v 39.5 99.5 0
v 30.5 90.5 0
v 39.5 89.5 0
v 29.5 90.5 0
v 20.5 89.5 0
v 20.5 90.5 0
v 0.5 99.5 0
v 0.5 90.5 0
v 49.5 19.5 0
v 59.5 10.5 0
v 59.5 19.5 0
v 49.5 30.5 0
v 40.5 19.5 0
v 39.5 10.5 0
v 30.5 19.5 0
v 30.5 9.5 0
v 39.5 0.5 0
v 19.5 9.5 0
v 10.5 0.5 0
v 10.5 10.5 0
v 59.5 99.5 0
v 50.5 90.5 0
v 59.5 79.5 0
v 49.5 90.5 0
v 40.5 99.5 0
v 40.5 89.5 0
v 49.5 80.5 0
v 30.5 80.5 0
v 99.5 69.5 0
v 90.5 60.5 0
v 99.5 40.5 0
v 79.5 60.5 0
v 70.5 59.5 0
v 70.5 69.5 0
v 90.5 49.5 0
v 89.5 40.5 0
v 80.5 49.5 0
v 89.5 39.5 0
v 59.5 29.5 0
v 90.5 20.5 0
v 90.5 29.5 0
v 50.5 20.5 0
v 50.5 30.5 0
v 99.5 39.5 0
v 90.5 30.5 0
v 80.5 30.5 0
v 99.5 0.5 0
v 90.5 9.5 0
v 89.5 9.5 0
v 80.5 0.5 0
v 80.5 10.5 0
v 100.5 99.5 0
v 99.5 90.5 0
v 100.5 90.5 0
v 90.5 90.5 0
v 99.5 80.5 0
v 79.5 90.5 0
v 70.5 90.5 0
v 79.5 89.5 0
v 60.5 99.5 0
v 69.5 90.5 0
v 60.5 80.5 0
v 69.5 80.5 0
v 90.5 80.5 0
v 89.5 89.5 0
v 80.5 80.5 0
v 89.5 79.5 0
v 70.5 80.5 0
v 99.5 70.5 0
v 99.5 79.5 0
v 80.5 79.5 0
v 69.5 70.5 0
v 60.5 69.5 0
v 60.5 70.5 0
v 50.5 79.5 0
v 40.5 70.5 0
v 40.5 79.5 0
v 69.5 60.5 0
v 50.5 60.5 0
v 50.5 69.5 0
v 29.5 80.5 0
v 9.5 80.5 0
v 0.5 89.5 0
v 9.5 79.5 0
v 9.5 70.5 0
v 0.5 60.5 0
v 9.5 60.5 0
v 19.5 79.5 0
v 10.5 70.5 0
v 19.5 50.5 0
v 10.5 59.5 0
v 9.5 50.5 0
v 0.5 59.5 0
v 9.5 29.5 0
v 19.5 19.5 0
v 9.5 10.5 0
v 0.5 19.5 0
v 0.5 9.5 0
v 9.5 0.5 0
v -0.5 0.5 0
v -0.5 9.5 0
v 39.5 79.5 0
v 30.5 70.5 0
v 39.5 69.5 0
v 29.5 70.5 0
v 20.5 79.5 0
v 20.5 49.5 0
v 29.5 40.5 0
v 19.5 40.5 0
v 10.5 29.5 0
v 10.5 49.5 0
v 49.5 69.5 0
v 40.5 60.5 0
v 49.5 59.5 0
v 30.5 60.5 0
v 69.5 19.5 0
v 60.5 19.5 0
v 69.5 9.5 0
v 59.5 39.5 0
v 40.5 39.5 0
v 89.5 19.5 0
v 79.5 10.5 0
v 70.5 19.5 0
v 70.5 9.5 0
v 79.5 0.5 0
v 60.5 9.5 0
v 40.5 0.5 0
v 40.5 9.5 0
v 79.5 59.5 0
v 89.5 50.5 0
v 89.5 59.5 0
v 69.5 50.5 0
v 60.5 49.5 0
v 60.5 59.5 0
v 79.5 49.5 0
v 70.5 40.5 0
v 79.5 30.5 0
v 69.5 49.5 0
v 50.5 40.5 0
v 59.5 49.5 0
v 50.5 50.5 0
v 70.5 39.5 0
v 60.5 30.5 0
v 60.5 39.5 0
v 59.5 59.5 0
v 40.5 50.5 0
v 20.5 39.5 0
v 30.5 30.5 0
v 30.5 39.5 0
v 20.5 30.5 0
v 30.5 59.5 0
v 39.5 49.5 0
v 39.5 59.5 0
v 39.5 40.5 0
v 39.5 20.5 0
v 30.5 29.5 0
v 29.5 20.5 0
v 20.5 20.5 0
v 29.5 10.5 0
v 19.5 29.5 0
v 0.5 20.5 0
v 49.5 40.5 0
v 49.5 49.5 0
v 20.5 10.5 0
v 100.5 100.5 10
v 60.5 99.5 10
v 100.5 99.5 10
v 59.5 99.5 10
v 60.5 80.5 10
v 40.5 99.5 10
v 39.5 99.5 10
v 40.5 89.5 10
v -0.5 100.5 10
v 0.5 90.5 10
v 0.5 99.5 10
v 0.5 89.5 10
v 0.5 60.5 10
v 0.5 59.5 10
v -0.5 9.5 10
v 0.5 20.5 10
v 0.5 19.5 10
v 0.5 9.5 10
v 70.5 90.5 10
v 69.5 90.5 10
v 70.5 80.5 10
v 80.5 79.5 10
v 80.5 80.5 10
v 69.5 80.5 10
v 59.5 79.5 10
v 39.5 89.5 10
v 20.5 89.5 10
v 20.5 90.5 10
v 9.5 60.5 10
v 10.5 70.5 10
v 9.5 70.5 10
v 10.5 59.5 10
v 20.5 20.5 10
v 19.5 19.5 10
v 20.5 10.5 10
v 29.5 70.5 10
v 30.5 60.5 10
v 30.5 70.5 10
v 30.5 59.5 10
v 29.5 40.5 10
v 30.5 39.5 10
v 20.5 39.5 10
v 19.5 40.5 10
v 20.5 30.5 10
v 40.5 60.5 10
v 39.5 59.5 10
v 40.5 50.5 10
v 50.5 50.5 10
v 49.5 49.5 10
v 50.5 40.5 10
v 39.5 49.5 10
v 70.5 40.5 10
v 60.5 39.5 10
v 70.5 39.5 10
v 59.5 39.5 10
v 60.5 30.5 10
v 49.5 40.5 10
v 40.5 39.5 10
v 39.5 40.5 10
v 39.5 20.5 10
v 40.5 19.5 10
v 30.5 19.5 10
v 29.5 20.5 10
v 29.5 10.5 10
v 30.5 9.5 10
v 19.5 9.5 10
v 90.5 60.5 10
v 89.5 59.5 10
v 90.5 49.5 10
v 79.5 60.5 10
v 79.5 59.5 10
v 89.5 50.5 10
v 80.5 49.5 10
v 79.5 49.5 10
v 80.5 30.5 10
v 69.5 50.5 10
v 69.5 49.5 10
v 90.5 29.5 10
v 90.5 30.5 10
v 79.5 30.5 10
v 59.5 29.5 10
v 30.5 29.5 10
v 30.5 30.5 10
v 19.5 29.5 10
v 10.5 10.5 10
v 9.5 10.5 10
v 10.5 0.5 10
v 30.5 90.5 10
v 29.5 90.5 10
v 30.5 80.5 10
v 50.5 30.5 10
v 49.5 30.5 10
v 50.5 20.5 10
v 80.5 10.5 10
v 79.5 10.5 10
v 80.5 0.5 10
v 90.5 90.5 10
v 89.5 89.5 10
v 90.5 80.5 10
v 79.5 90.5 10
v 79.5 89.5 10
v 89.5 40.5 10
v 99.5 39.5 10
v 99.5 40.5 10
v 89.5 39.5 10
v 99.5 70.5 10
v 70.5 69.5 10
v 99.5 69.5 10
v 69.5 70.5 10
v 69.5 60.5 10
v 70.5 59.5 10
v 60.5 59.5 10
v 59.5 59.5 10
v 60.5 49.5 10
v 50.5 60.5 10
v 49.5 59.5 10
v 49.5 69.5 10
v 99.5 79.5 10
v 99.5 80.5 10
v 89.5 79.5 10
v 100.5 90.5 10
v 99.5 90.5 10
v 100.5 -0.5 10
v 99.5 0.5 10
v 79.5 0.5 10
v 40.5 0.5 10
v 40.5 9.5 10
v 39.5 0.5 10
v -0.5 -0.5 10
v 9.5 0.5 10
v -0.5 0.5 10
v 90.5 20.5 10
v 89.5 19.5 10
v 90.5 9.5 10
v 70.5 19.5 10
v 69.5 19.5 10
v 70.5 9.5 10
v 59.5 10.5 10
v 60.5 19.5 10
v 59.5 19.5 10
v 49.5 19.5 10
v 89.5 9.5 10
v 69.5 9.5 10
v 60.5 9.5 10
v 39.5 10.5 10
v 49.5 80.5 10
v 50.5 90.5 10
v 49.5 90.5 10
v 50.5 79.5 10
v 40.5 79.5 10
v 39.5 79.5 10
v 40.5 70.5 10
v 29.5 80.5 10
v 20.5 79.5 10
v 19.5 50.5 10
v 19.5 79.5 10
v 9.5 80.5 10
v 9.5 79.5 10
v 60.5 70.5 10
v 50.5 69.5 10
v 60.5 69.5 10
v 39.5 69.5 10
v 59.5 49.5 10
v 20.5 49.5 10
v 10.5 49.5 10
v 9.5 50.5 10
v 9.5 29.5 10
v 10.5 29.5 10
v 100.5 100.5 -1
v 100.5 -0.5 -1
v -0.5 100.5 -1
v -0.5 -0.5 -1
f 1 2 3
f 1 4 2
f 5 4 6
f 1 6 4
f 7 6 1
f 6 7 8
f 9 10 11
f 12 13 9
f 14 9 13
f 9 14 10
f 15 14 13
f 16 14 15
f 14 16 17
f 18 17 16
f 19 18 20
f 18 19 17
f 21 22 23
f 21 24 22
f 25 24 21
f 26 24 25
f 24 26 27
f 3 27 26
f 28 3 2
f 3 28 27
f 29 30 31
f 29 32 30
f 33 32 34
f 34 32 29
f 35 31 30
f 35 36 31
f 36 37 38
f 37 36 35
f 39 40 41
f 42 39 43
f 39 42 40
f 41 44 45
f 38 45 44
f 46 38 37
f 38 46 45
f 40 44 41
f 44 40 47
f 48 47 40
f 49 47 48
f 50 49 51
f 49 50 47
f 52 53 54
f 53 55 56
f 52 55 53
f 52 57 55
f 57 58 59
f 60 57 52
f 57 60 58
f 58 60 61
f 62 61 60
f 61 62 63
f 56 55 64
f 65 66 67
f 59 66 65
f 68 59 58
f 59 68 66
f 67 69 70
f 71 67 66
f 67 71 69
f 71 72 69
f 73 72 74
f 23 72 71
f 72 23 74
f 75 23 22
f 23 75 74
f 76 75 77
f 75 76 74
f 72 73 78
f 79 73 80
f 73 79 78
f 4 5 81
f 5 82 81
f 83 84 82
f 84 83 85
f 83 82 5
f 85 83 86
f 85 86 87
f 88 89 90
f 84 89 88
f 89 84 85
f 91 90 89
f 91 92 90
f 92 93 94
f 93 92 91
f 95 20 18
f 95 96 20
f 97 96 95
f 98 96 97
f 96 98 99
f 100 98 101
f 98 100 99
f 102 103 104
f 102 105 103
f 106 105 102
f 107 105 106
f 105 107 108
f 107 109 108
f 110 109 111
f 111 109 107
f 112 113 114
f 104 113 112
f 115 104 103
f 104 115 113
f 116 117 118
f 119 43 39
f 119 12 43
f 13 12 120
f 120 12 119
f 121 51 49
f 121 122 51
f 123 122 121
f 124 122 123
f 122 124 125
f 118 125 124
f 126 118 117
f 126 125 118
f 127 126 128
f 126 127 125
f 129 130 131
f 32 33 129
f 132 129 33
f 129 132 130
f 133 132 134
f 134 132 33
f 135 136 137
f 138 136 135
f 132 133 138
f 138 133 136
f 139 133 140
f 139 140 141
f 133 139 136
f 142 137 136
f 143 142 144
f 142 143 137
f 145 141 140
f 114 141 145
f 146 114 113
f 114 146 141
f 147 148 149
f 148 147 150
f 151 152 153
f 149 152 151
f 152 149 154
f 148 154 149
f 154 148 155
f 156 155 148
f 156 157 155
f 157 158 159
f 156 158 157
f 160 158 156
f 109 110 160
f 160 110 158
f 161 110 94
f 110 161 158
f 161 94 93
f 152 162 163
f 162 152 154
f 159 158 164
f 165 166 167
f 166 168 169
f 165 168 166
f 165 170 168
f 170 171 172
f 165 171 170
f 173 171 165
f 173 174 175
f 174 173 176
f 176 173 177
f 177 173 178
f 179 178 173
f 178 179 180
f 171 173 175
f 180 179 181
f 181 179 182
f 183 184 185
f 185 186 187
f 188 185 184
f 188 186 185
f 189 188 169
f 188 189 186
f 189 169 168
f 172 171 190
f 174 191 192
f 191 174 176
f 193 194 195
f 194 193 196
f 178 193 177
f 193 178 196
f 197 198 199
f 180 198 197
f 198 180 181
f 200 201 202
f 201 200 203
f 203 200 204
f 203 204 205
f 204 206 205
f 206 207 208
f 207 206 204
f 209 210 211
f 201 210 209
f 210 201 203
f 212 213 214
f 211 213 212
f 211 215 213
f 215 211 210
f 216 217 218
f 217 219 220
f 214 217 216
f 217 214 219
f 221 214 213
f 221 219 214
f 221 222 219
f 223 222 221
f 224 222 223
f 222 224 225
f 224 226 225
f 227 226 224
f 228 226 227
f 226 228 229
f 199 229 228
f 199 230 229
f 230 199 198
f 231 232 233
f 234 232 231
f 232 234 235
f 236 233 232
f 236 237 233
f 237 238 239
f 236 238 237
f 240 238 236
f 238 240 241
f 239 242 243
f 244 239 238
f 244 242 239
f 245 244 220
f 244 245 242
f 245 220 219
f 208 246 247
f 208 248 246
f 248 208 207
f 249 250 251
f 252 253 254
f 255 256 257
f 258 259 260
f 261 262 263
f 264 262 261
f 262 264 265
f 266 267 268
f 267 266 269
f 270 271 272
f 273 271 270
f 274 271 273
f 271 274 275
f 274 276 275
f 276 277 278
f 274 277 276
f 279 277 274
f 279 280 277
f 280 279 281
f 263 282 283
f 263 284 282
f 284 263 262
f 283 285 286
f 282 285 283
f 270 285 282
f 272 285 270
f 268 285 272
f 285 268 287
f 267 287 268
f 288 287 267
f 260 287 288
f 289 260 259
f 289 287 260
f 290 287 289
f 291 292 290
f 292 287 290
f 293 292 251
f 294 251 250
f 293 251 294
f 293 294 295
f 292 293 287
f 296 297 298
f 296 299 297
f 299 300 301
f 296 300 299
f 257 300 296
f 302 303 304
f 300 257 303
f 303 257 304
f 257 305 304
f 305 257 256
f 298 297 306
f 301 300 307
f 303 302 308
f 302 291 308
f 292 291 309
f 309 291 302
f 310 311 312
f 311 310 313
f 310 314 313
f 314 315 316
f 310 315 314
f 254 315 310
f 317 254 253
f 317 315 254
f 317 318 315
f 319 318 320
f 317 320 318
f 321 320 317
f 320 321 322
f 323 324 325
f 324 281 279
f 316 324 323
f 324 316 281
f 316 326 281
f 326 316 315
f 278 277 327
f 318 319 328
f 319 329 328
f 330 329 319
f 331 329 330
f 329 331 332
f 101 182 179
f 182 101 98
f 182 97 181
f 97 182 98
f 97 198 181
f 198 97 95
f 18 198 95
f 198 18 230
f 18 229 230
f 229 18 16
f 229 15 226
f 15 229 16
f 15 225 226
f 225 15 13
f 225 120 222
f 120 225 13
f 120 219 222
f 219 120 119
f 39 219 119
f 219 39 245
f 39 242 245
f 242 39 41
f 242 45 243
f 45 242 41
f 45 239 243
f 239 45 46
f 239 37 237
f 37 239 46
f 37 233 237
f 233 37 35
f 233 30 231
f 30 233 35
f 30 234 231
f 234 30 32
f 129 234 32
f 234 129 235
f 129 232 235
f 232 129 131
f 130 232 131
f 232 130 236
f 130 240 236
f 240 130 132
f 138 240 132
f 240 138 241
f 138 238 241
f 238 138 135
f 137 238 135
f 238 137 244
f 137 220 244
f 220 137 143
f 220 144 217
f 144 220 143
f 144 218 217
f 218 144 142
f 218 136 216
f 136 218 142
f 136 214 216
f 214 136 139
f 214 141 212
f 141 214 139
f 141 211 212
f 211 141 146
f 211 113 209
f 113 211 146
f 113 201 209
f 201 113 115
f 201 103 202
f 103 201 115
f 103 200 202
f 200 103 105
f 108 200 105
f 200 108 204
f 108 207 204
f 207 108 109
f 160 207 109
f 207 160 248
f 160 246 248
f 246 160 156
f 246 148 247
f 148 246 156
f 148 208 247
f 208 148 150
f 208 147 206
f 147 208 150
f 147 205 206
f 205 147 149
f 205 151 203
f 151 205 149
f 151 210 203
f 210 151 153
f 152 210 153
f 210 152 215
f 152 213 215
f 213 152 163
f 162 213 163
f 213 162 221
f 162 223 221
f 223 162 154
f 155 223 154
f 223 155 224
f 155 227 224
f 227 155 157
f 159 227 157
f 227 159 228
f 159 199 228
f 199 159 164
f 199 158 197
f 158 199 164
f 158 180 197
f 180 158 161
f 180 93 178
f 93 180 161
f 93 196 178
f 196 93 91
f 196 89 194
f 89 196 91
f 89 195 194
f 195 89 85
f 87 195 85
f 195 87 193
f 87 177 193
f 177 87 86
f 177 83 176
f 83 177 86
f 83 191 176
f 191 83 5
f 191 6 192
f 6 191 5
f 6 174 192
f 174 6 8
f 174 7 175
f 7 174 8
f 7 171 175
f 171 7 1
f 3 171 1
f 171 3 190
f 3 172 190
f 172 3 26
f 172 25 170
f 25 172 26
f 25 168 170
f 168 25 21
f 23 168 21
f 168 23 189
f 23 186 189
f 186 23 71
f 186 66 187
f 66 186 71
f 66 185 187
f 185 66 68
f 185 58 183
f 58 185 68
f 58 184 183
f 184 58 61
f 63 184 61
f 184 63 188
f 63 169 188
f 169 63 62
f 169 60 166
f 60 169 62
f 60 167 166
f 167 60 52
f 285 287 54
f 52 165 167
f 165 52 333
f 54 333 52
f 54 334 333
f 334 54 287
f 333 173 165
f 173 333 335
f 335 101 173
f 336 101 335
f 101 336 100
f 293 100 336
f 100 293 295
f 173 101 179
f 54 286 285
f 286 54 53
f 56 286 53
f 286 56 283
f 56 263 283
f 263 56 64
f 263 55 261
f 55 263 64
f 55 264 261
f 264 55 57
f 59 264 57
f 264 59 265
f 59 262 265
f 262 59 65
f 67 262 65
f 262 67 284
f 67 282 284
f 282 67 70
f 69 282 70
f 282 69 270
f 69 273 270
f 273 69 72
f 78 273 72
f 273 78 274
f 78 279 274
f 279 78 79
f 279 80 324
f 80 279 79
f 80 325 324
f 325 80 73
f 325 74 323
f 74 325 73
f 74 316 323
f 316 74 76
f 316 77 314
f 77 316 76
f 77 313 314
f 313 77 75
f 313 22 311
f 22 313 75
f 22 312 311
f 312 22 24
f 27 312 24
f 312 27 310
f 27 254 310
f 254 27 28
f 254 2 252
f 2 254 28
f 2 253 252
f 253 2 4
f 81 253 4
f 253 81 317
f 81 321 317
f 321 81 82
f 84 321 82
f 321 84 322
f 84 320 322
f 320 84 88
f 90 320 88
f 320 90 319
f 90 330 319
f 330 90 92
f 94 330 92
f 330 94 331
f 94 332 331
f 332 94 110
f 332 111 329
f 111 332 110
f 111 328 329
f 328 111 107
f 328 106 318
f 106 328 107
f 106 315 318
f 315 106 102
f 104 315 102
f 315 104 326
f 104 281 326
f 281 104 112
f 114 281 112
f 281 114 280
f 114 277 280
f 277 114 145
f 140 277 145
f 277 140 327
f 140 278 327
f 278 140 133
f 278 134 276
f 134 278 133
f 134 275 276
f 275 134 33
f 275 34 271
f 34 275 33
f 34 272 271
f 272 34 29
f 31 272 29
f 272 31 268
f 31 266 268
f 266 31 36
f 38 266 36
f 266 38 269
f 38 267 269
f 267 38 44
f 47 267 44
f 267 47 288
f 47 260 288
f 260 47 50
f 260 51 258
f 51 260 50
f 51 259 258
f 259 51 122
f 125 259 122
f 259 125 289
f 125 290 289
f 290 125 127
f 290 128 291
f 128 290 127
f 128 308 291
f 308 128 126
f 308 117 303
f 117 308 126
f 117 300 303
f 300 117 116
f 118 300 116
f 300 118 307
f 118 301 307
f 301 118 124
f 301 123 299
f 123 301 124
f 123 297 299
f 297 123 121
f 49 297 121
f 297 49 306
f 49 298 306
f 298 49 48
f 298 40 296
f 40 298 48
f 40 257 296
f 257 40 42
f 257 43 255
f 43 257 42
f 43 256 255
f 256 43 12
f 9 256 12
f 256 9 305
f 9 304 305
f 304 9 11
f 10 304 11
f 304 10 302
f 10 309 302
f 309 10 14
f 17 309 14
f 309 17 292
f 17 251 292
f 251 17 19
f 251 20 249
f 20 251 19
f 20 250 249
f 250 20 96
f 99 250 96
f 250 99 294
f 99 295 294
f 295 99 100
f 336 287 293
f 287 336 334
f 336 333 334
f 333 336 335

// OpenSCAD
rows = 10; 
columns = 10; 
wall_thickness = 1;
wall_height = 10;
block_width = 10;
bottom = "YES";


/*
 * constants, for clearness
 *
 */
 
// random directions, for picking up a direction to visit the next block
function PERMUTATION_OF_FOUR() = [
    [1, 2, 3, 4],
    [1, 2, 4, 3],
    [1, 3, 2, 4],
    [1, 3, 4, 2],
    [1, 4, 2, 3],
    [1, 4, 3, 2],
    [2, 1, 3, 4],
    [2, 1, 4, 3],
    [2, 3, 1, 4],
    [2, 3, 4, 1],
    [2, 4, 1, 3],
    [2, 4, 3, 1],
    [3, 1, 2, 4],
    [3, 1, 4, 2],
    [3, 2, 1, 4],
    [3, 2, 4, 1],
    [3, 4, 1, 2],
    [3, 4, 2, 1],
    [4, 1, 2, 3],
    [4, 1, 3, 2],
    [4, 2, 1, 3],
    [4, 2, 3, 1],
    [4, 3, 1, 2],
    [4, 3, 2, 1]
];

function NO_WALL() = 0;
function UP_WALL() = 1;
function RIGHT_WALL() = 2;
function UP_RIGHT_WALL() = 3;

function NOT_VISITED() = 0;
function VISITED() = 1;

/* 
 * modules for creating a maze
 *
 */

// give a [x, y] point and length. draw a line in the x direction
module x_line(point, length, thickness = 1) {
    offset = thickness / 2;
    translate([point[0] - offset, point[1] - offset, 0]) 
        square([length + thickness, thickness]);
}

// give a [x, y] point and length. draw a line in the y direction
module y_line(point, length, thickness = 1) {
    offset = thickness / 2;
    translate([point[0] - offset, point[1] - offset, 0])  
        square([thickness, length + thickness]);
}

// create the outer wall of maze
module maze_outer_wall(rows, columns, block_width = 5, wall_thickness = 1) {
    x_line([0, rows * block_width], columns * block_width, wall_thickness);
    y_line([0, block_width], (rows - 1) * block_width, wall_thickness);
}

// create the inner wall of maze
module maze_inner_wall(maze, block_width = 5, wall_thickness = 1) {
    for(i = [0:len(maze) - 1]) {
        cord = maze[i];
        x = (cord[0] - 1) * block_width;
        y = (cord[1] - 1) * block_width;
        v = cord[3];
        
        if(v == 1 || v == 3) {
            x_line([x, y], block_width, wall_thickness);
        }
        if(v == 2 || v == 3) {
            y_line([x + block_width, y], block_width, wall_thickness);
        }
    }  
}

// create a maze
module maze(rows, columns, maze_vector, block_width = 5, wall_thickness = 1) {
     maze_outer_wall(rows, columns, block_width, wall_thickness);
     maze_inner_wall(maze_vector, block_width, wall_thickness);
}

/* 
 * utilities functions
 *
 */

// comare the equality of [x1, y1] and [x2, y2]
function cord_equals(cord1, cord2) = cord1 == cord2;

// is the point visited?
function not_visited(cord, vs, index = 0) =
    index == len(vs) ? true : 
        (cord_equals([vs[index][0], vs[index][1]], cord) && vs[index][2] == 1 ? false :
            not_visited(cord, vs, index + 1));
            
// pick a direction randomly
function rand_dirs() =
    PERMUTATION_OF_FOUR()[round(rands(0, 24, 1)[0])]; 

// replace v1 in the vector with v2 
function replace(v1, v2, vs) =
    [for(i = [0:len(vs) - 1]) vs[i] == v1 ? v2 : vs[i]];
    
/* 
 * functions for generating a maze vector
 *
 */

// initialize a maze
function init_maze(rows, columns) = 
    [
	    for(c = [1 : columns]) 
	        for(r = [1 : rows]) 
		        [c, r, 0,  UP_RIGHT_WALL()]
	];
    
// find a vector in the maze vector
function find(i, j, maze_vector, index = 0) =
    index == len(maze_vector) ? [] : (
        cord_equals([i, j], [maze_vector[index][0], maze_vector[index][1]]) ? maze_vector[index] : find(i, j, maze_vector, index + 1)
    );

////
// NO_WALL = 0;
// UP_WALL = 1;
// RIGHT_WALL = 2;
// UP_RIGHT_WALL = 3;
function delete_right_wall(original_block) = 
    original_block == NO_WALL() || original_block == RIGHT_WALL() ? NO_WALL() : UP_WALL();

function delete_up_wall(original_block) = 
    (original_block == NO_WALL() || original_block == UP_WALL()) ? NO_WALL() : RIGHT_WALL();
    
function delete_right_wall_of(vs, is_visited, maze_vector) =
    replace(vs, [vs[0], vs[1] , is_visited, delete_right_wall(vs[3])] ,maze_vector);

function delete_up_wall_of(vs, is_visited, maze_vector) =
    replace(vs, [vs[0], vs[1] , is_visited, delete_up_wall(vs[3])] ,maze_vector);

function go_right(i, j, rows, columns, maze_vector) =
    go_maze(i + 1, j, rows, columns, delete_right_wall_of(find(i, j, maze_vector), VISITED(), maze_vector));
    
function go_up(i, j, rows, columns, maze_vector) =
    go_maze(i, j - 1, rows, columns, delete_up_wall_of(find(i, j, maze_vector), VISITED(), maze_vector));
    
function visit(v, maze_vector) =
    replace(v, [v[0], v[1], VISITED(), v[3]], maze_vector);
 
function go_left(i, j, rows, columns, maze_vector) =
    go_maze(i - 1, j, rows, columns, delete_right_wall_of(find(i - 1, j, maze_vector), NOT_VISITED(), maze_vector));
    
function go_down(i, j, rows, columns, maze_vector) =
    go_maze(i, j + 1, rows, columns, delete_up_wall_of(find(i, j + 1, maze_vector), NOT_VISITED(), maze_vector));
    
function go_maze(i, j, rows, columns, maze_vector) =
    look_around(i, j, rand_dirs(), rows, columns, visit(find(i, j, maze_vector), maze_vector));
    
function look_around(i, j, dirs, rows, columns, maze_vector, index = 0) =
    index == 4 ? maze_vector : 
        look_around( 
            i, j, dirs, 
            rows, columns, 
            build_wall(i, j, dirs[index], rows, columns, maze_vector), 
            index + 1
        ); 

function build_wall(i, j, n, rows, columns, maze_vector) = 
    n == 1 && i != columns && not_visited([i + 1, j], maze_vector) ? go_right(i, j, rows, columns, maze_vector) : ( 
        n == 2 && j != 1 && not_visited([i, j - 1], maze_vector) ? go_up(i, j, rows, columns, maze_vector)  : (
            n == 3 && i != 1 && not_visited([i - 1, j], maze_vector) ? go_left(i, j,rows, columns,  maze_vector)  : (
                n == 4 && j != rows && not_visited([i, j + 1], maze_vector) ? go_down(i, j, rows, columns, maze_vector) : maze_vector
            ) 
        )
    ); 
 
/*
 * create a maze
 *
 */
maze_vector = go_maze(1, 1, rows, columns, replace([columns, rows, 0, UP_RIGHT_WALL()], [columns, rows, 0, UP_WALL()], init_maze(rows, columns)));
linear_extrude(wall_height) 
    maze(rows, columns, maze_vector, block_width, wall_thickness);
	
if(bottom == "YES") {
    translate([-wall_thickness / 2, -wall_thickness / 2, -wall_thickness]) 
	    linear_extrude(wall_thickness) square([block_width * columns + wall_thickness, block_width * rows + wall_thickness]);
}
